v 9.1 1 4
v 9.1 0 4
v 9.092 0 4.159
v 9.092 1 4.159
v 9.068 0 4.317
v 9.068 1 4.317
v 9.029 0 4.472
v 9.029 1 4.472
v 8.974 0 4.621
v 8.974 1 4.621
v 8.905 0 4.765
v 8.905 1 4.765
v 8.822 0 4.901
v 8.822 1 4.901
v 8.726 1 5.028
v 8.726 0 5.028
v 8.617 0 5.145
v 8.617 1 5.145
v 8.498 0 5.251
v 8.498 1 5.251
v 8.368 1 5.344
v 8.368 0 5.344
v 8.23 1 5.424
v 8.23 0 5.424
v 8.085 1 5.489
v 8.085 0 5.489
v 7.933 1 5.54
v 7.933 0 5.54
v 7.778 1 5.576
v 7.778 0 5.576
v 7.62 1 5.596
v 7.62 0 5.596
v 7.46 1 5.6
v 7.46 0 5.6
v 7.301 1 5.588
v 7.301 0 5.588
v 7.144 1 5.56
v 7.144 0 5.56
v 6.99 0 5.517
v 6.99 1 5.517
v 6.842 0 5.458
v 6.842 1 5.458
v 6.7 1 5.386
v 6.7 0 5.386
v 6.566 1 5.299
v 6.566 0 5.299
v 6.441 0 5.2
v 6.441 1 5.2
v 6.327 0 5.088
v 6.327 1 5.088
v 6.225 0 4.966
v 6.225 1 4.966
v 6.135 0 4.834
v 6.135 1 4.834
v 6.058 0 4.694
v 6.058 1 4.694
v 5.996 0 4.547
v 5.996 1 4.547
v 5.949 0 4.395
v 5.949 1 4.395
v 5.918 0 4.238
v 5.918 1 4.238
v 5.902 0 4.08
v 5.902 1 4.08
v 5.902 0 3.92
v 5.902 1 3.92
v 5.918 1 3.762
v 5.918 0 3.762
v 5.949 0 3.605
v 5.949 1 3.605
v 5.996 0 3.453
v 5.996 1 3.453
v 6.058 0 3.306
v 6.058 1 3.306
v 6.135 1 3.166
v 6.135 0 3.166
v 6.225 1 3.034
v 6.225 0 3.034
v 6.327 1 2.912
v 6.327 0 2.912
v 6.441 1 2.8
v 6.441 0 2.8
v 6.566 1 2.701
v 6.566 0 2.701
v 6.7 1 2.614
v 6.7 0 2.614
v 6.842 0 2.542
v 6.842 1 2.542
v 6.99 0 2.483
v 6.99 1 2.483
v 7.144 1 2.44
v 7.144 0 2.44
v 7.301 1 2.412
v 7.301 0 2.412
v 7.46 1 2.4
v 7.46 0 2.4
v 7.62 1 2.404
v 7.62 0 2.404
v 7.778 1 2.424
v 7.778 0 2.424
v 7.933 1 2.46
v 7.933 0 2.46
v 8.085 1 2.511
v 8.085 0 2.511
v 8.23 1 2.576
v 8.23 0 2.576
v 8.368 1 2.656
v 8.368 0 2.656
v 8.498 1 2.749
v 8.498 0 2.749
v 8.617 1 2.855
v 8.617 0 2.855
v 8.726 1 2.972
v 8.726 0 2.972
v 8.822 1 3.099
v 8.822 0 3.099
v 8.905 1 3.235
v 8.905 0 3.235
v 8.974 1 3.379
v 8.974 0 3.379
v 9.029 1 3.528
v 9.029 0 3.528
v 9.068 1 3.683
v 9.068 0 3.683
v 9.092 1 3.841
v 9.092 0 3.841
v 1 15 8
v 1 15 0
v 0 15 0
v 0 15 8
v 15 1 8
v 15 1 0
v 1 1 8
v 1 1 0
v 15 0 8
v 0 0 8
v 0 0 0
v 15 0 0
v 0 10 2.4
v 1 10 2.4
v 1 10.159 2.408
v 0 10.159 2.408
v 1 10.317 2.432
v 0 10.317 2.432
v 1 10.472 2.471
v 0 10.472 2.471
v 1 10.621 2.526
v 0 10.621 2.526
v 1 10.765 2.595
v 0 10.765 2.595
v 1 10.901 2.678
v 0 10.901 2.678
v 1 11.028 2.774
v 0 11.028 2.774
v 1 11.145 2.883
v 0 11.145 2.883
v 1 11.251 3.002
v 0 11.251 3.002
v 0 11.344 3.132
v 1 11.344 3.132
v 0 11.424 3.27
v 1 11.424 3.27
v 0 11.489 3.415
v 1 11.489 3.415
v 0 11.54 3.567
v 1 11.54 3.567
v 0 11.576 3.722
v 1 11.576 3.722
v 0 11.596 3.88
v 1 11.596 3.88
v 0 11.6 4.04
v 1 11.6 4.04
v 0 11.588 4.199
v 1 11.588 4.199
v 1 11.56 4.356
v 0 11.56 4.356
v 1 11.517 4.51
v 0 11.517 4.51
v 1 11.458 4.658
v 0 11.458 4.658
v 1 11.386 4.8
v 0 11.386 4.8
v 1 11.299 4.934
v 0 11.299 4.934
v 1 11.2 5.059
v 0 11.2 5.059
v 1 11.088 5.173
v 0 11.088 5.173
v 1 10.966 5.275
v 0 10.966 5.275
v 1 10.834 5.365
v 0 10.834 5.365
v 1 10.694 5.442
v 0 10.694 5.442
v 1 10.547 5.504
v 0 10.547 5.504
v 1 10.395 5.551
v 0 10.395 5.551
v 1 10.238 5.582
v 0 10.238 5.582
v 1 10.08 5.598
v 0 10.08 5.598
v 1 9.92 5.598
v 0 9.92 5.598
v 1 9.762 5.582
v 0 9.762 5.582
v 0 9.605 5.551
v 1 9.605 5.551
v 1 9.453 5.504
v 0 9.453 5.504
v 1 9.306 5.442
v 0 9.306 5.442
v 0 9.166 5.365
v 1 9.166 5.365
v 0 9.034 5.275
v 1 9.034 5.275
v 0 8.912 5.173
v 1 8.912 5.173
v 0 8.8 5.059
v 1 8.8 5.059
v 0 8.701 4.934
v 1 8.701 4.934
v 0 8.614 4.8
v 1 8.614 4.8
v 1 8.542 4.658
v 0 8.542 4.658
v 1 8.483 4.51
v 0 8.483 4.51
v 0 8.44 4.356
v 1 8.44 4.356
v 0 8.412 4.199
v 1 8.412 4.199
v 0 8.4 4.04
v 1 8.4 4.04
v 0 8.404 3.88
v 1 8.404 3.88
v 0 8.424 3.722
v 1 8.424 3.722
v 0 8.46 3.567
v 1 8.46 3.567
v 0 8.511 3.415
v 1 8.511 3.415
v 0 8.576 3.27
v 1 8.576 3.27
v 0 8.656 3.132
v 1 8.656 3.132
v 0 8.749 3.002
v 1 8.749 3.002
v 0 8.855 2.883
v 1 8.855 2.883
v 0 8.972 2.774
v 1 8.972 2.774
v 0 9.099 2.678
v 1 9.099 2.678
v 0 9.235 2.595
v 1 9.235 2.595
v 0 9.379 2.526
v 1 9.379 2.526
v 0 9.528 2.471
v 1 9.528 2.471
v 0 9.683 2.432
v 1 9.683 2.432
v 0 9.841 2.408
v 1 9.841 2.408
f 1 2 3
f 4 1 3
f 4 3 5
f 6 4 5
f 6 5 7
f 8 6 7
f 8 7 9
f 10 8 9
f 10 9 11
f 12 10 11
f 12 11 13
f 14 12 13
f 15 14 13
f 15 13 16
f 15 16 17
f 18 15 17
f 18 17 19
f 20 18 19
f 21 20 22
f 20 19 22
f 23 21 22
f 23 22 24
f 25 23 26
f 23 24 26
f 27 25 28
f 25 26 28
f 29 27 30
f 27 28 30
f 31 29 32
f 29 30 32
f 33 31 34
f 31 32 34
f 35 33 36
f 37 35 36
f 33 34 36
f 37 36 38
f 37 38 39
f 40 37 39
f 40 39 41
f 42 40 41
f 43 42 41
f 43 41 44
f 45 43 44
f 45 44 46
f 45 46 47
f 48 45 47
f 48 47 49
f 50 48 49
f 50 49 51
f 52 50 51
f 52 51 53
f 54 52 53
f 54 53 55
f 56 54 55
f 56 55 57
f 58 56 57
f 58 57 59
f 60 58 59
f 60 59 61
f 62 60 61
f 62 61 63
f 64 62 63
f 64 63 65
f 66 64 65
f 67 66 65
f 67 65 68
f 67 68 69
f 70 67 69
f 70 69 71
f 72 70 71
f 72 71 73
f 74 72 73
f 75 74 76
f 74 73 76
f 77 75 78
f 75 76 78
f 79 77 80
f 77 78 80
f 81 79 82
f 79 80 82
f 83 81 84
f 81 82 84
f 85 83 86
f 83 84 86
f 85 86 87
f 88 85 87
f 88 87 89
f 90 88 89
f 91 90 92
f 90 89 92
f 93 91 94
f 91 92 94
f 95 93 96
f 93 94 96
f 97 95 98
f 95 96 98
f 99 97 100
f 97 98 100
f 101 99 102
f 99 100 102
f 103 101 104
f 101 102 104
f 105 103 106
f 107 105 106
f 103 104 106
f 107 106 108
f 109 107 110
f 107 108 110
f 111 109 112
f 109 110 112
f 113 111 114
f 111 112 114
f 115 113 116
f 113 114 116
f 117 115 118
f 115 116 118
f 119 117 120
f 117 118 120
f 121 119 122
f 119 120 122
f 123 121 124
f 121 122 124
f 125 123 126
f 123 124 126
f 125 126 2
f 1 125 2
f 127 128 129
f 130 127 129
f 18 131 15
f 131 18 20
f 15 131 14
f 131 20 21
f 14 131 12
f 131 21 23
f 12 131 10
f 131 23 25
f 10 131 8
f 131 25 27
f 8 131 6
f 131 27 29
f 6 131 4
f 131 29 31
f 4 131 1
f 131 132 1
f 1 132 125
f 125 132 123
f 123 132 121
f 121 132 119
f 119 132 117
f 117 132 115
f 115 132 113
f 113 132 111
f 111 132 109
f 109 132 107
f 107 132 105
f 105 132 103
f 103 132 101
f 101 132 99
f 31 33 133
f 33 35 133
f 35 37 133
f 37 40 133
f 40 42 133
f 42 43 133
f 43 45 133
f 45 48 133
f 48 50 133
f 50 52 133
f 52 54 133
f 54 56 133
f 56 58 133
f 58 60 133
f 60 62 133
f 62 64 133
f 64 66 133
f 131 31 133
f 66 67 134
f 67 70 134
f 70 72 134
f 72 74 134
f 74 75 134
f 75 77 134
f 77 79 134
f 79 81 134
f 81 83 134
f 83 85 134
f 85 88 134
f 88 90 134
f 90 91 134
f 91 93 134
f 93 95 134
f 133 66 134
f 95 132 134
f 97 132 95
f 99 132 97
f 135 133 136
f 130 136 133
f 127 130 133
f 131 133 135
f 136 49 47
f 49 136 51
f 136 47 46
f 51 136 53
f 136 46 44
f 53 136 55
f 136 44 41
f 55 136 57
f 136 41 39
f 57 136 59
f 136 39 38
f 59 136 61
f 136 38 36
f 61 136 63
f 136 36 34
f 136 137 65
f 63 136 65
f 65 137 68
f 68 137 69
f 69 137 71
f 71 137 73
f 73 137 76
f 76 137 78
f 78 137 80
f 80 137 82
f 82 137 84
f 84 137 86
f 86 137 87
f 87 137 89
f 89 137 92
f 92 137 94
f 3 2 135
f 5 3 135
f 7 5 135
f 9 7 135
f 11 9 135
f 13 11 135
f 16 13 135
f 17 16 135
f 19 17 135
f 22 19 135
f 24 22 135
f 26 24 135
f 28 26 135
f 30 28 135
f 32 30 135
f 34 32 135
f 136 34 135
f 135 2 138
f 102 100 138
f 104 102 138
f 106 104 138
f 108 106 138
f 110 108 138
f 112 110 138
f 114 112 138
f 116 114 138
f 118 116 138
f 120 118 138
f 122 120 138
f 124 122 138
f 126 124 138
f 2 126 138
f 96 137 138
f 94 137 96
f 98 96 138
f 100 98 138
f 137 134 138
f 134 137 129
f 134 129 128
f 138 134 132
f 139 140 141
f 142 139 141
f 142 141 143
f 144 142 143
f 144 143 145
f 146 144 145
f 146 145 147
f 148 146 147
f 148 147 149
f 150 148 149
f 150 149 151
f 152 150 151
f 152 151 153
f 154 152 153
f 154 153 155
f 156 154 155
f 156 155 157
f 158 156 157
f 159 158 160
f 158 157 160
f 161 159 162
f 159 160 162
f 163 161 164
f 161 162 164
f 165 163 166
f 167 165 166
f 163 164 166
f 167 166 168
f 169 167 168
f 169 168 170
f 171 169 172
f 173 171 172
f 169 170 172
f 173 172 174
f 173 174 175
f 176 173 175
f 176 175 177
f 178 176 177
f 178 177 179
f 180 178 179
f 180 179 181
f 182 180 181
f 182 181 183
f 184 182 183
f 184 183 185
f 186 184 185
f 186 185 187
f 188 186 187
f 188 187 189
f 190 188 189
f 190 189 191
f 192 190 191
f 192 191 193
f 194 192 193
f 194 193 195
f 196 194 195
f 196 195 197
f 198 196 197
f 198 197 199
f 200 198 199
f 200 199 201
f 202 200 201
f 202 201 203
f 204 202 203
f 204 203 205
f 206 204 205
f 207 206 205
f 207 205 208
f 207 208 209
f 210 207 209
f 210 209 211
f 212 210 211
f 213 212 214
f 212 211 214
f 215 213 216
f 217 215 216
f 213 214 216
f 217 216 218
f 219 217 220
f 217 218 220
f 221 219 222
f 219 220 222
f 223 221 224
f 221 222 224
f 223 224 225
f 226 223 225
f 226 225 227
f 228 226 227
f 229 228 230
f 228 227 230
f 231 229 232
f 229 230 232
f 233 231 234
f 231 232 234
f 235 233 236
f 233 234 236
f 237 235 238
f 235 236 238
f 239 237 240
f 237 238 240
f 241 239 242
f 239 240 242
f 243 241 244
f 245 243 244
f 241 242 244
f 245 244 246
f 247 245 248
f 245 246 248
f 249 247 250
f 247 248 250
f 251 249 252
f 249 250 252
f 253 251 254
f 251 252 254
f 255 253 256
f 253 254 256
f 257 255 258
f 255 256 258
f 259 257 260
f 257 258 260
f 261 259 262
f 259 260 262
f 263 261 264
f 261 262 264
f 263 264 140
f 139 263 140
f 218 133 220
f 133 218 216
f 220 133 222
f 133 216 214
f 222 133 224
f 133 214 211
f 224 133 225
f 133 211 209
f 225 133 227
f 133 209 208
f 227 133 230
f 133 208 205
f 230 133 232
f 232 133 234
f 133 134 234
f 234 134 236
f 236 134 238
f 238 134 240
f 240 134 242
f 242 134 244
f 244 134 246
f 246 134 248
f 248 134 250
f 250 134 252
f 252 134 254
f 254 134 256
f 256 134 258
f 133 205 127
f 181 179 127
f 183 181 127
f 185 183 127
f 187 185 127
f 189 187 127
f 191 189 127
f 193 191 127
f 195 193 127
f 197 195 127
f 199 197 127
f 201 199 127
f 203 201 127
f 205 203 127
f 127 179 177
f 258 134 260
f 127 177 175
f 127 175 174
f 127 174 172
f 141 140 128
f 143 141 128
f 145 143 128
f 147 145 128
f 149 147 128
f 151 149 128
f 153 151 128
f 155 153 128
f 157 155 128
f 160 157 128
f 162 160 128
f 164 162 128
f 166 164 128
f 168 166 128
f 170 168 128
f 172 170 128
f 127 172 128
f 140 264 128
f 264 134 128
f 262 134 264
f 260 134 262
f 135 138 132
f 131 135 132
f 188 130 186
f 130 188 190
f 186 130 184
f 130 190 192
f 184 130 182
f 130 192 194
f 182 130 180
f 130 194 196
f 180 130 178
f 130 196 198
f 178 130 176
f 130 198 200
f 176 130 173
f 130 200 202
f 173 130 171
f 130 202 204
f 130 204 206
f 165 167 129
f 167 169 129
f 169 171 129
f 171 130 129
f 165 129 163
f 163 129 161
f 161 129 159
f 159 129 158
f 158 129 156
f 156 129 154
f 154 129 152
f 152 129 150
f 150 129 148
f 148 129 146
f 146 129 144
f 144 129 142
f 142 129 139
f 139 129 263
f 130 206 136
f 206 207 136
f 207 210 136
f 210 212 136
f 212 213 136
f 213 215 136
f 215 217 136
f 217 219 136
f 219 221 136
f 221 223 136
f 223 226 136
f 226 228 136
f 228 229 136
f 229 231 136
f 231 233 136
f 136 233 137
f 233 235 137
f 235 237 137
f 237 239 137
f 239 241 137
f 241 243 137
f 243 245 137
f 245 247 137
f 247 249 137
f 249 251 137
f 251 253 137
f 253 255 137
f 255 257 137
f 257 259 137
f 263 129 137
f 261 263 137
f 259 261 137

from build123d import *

# Parameters (mm, degrees)
EXTRUDE_1_DEPTH    = 8
SKETCH1_R          = 1.6
CUT_EXTRUDE1_DEPTH = 2
SKETCH_2_R         = 1.6
CUT_EXTRUDE2_DEPTH = 16


with BuildPart() as part:
    # Эскиз1 → Бобышка-Вытянуть1 (new body)
    with BuildSketch(Plane.XY):
        Polygon((0, 0), (15, 0), (15, 1), (1, 1), (1, 15), (0, 15), align=None)
    extrude(amount=EXTRUDE_1_DEPTH)

    # Sketch1 → Cut-Extrude1 (cut, through all)
    with BuildSketch(Plane(origin=(1, 0, 0), x_dir=(0, 0, -1), z_dir=(1, 0, 0))):
        with Locations((-4, 10)):
            Circle(SKETCH1_R)
    extrude(amount=-CUT_EXTRUDE1_DEPTH, mode=Mode.SUBTRACT)

    # Эскиз2 → Cut-Extrude2 (cut, through all)
    with BuildSketch(Plane.XZ):
        with Locations((7.5, 4)):
            Circle(SKETCH_2_R)
    extrude(amount=-CUT_EXTRUDE2_DEPTH, mode=Mode.SUBTRACT)


solid = part.part
